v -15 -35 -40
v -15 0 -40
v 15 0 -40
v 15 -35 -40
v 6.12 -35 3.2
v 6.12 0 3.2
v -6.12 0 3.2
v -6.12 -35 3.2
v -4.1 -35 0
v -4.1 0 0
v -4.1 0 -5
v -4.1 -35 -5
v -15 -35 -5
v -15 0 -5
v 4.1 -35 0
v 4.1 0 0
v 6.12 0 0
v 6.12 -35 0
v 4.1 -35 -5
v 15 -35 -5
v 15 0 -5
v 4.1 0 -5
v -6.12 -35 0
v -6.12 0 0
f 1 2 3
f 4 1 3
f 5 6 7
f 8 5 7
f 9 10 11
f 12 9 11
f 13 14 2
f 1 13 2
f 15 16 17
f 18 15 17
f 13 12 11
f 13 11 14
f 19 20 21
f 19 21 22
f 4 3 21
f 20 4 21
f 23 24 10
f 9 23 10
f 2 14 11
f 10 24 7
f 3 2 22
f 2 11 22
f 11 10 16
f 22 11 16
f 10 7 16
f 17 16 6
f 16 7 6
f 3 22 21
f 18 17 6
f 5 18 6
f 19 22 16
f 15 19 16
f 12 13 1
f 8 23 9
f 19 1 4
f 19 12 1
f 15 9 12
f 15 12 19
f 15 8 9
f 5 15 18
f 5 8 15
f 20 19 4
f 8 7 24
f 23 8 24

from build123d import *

# Parameters (mm, degrees)
F1_DEPTH = 35


with BuildPart() as f1:
    # F0 (on Front) → F1 (new body)
    with BuildSketch(Plane.XZ):
        Polygon((-6.12, 3.2), (-6.12, 0), (-4.1, 0), (-4.1, -5), (4.1, -5), (4.1, 0), (6.12, 0), (6.12, 3.2), (0, 3.2), align=None)
        Polygon((4.1, -5), (-4.1, -5), (-11.1, -5), (-15, -5), (-15, -40), (15, -40), (15, -5), (11.1, -5), align=None)
    extrude(amount=F1_DEPTH)


solid = f1.part
